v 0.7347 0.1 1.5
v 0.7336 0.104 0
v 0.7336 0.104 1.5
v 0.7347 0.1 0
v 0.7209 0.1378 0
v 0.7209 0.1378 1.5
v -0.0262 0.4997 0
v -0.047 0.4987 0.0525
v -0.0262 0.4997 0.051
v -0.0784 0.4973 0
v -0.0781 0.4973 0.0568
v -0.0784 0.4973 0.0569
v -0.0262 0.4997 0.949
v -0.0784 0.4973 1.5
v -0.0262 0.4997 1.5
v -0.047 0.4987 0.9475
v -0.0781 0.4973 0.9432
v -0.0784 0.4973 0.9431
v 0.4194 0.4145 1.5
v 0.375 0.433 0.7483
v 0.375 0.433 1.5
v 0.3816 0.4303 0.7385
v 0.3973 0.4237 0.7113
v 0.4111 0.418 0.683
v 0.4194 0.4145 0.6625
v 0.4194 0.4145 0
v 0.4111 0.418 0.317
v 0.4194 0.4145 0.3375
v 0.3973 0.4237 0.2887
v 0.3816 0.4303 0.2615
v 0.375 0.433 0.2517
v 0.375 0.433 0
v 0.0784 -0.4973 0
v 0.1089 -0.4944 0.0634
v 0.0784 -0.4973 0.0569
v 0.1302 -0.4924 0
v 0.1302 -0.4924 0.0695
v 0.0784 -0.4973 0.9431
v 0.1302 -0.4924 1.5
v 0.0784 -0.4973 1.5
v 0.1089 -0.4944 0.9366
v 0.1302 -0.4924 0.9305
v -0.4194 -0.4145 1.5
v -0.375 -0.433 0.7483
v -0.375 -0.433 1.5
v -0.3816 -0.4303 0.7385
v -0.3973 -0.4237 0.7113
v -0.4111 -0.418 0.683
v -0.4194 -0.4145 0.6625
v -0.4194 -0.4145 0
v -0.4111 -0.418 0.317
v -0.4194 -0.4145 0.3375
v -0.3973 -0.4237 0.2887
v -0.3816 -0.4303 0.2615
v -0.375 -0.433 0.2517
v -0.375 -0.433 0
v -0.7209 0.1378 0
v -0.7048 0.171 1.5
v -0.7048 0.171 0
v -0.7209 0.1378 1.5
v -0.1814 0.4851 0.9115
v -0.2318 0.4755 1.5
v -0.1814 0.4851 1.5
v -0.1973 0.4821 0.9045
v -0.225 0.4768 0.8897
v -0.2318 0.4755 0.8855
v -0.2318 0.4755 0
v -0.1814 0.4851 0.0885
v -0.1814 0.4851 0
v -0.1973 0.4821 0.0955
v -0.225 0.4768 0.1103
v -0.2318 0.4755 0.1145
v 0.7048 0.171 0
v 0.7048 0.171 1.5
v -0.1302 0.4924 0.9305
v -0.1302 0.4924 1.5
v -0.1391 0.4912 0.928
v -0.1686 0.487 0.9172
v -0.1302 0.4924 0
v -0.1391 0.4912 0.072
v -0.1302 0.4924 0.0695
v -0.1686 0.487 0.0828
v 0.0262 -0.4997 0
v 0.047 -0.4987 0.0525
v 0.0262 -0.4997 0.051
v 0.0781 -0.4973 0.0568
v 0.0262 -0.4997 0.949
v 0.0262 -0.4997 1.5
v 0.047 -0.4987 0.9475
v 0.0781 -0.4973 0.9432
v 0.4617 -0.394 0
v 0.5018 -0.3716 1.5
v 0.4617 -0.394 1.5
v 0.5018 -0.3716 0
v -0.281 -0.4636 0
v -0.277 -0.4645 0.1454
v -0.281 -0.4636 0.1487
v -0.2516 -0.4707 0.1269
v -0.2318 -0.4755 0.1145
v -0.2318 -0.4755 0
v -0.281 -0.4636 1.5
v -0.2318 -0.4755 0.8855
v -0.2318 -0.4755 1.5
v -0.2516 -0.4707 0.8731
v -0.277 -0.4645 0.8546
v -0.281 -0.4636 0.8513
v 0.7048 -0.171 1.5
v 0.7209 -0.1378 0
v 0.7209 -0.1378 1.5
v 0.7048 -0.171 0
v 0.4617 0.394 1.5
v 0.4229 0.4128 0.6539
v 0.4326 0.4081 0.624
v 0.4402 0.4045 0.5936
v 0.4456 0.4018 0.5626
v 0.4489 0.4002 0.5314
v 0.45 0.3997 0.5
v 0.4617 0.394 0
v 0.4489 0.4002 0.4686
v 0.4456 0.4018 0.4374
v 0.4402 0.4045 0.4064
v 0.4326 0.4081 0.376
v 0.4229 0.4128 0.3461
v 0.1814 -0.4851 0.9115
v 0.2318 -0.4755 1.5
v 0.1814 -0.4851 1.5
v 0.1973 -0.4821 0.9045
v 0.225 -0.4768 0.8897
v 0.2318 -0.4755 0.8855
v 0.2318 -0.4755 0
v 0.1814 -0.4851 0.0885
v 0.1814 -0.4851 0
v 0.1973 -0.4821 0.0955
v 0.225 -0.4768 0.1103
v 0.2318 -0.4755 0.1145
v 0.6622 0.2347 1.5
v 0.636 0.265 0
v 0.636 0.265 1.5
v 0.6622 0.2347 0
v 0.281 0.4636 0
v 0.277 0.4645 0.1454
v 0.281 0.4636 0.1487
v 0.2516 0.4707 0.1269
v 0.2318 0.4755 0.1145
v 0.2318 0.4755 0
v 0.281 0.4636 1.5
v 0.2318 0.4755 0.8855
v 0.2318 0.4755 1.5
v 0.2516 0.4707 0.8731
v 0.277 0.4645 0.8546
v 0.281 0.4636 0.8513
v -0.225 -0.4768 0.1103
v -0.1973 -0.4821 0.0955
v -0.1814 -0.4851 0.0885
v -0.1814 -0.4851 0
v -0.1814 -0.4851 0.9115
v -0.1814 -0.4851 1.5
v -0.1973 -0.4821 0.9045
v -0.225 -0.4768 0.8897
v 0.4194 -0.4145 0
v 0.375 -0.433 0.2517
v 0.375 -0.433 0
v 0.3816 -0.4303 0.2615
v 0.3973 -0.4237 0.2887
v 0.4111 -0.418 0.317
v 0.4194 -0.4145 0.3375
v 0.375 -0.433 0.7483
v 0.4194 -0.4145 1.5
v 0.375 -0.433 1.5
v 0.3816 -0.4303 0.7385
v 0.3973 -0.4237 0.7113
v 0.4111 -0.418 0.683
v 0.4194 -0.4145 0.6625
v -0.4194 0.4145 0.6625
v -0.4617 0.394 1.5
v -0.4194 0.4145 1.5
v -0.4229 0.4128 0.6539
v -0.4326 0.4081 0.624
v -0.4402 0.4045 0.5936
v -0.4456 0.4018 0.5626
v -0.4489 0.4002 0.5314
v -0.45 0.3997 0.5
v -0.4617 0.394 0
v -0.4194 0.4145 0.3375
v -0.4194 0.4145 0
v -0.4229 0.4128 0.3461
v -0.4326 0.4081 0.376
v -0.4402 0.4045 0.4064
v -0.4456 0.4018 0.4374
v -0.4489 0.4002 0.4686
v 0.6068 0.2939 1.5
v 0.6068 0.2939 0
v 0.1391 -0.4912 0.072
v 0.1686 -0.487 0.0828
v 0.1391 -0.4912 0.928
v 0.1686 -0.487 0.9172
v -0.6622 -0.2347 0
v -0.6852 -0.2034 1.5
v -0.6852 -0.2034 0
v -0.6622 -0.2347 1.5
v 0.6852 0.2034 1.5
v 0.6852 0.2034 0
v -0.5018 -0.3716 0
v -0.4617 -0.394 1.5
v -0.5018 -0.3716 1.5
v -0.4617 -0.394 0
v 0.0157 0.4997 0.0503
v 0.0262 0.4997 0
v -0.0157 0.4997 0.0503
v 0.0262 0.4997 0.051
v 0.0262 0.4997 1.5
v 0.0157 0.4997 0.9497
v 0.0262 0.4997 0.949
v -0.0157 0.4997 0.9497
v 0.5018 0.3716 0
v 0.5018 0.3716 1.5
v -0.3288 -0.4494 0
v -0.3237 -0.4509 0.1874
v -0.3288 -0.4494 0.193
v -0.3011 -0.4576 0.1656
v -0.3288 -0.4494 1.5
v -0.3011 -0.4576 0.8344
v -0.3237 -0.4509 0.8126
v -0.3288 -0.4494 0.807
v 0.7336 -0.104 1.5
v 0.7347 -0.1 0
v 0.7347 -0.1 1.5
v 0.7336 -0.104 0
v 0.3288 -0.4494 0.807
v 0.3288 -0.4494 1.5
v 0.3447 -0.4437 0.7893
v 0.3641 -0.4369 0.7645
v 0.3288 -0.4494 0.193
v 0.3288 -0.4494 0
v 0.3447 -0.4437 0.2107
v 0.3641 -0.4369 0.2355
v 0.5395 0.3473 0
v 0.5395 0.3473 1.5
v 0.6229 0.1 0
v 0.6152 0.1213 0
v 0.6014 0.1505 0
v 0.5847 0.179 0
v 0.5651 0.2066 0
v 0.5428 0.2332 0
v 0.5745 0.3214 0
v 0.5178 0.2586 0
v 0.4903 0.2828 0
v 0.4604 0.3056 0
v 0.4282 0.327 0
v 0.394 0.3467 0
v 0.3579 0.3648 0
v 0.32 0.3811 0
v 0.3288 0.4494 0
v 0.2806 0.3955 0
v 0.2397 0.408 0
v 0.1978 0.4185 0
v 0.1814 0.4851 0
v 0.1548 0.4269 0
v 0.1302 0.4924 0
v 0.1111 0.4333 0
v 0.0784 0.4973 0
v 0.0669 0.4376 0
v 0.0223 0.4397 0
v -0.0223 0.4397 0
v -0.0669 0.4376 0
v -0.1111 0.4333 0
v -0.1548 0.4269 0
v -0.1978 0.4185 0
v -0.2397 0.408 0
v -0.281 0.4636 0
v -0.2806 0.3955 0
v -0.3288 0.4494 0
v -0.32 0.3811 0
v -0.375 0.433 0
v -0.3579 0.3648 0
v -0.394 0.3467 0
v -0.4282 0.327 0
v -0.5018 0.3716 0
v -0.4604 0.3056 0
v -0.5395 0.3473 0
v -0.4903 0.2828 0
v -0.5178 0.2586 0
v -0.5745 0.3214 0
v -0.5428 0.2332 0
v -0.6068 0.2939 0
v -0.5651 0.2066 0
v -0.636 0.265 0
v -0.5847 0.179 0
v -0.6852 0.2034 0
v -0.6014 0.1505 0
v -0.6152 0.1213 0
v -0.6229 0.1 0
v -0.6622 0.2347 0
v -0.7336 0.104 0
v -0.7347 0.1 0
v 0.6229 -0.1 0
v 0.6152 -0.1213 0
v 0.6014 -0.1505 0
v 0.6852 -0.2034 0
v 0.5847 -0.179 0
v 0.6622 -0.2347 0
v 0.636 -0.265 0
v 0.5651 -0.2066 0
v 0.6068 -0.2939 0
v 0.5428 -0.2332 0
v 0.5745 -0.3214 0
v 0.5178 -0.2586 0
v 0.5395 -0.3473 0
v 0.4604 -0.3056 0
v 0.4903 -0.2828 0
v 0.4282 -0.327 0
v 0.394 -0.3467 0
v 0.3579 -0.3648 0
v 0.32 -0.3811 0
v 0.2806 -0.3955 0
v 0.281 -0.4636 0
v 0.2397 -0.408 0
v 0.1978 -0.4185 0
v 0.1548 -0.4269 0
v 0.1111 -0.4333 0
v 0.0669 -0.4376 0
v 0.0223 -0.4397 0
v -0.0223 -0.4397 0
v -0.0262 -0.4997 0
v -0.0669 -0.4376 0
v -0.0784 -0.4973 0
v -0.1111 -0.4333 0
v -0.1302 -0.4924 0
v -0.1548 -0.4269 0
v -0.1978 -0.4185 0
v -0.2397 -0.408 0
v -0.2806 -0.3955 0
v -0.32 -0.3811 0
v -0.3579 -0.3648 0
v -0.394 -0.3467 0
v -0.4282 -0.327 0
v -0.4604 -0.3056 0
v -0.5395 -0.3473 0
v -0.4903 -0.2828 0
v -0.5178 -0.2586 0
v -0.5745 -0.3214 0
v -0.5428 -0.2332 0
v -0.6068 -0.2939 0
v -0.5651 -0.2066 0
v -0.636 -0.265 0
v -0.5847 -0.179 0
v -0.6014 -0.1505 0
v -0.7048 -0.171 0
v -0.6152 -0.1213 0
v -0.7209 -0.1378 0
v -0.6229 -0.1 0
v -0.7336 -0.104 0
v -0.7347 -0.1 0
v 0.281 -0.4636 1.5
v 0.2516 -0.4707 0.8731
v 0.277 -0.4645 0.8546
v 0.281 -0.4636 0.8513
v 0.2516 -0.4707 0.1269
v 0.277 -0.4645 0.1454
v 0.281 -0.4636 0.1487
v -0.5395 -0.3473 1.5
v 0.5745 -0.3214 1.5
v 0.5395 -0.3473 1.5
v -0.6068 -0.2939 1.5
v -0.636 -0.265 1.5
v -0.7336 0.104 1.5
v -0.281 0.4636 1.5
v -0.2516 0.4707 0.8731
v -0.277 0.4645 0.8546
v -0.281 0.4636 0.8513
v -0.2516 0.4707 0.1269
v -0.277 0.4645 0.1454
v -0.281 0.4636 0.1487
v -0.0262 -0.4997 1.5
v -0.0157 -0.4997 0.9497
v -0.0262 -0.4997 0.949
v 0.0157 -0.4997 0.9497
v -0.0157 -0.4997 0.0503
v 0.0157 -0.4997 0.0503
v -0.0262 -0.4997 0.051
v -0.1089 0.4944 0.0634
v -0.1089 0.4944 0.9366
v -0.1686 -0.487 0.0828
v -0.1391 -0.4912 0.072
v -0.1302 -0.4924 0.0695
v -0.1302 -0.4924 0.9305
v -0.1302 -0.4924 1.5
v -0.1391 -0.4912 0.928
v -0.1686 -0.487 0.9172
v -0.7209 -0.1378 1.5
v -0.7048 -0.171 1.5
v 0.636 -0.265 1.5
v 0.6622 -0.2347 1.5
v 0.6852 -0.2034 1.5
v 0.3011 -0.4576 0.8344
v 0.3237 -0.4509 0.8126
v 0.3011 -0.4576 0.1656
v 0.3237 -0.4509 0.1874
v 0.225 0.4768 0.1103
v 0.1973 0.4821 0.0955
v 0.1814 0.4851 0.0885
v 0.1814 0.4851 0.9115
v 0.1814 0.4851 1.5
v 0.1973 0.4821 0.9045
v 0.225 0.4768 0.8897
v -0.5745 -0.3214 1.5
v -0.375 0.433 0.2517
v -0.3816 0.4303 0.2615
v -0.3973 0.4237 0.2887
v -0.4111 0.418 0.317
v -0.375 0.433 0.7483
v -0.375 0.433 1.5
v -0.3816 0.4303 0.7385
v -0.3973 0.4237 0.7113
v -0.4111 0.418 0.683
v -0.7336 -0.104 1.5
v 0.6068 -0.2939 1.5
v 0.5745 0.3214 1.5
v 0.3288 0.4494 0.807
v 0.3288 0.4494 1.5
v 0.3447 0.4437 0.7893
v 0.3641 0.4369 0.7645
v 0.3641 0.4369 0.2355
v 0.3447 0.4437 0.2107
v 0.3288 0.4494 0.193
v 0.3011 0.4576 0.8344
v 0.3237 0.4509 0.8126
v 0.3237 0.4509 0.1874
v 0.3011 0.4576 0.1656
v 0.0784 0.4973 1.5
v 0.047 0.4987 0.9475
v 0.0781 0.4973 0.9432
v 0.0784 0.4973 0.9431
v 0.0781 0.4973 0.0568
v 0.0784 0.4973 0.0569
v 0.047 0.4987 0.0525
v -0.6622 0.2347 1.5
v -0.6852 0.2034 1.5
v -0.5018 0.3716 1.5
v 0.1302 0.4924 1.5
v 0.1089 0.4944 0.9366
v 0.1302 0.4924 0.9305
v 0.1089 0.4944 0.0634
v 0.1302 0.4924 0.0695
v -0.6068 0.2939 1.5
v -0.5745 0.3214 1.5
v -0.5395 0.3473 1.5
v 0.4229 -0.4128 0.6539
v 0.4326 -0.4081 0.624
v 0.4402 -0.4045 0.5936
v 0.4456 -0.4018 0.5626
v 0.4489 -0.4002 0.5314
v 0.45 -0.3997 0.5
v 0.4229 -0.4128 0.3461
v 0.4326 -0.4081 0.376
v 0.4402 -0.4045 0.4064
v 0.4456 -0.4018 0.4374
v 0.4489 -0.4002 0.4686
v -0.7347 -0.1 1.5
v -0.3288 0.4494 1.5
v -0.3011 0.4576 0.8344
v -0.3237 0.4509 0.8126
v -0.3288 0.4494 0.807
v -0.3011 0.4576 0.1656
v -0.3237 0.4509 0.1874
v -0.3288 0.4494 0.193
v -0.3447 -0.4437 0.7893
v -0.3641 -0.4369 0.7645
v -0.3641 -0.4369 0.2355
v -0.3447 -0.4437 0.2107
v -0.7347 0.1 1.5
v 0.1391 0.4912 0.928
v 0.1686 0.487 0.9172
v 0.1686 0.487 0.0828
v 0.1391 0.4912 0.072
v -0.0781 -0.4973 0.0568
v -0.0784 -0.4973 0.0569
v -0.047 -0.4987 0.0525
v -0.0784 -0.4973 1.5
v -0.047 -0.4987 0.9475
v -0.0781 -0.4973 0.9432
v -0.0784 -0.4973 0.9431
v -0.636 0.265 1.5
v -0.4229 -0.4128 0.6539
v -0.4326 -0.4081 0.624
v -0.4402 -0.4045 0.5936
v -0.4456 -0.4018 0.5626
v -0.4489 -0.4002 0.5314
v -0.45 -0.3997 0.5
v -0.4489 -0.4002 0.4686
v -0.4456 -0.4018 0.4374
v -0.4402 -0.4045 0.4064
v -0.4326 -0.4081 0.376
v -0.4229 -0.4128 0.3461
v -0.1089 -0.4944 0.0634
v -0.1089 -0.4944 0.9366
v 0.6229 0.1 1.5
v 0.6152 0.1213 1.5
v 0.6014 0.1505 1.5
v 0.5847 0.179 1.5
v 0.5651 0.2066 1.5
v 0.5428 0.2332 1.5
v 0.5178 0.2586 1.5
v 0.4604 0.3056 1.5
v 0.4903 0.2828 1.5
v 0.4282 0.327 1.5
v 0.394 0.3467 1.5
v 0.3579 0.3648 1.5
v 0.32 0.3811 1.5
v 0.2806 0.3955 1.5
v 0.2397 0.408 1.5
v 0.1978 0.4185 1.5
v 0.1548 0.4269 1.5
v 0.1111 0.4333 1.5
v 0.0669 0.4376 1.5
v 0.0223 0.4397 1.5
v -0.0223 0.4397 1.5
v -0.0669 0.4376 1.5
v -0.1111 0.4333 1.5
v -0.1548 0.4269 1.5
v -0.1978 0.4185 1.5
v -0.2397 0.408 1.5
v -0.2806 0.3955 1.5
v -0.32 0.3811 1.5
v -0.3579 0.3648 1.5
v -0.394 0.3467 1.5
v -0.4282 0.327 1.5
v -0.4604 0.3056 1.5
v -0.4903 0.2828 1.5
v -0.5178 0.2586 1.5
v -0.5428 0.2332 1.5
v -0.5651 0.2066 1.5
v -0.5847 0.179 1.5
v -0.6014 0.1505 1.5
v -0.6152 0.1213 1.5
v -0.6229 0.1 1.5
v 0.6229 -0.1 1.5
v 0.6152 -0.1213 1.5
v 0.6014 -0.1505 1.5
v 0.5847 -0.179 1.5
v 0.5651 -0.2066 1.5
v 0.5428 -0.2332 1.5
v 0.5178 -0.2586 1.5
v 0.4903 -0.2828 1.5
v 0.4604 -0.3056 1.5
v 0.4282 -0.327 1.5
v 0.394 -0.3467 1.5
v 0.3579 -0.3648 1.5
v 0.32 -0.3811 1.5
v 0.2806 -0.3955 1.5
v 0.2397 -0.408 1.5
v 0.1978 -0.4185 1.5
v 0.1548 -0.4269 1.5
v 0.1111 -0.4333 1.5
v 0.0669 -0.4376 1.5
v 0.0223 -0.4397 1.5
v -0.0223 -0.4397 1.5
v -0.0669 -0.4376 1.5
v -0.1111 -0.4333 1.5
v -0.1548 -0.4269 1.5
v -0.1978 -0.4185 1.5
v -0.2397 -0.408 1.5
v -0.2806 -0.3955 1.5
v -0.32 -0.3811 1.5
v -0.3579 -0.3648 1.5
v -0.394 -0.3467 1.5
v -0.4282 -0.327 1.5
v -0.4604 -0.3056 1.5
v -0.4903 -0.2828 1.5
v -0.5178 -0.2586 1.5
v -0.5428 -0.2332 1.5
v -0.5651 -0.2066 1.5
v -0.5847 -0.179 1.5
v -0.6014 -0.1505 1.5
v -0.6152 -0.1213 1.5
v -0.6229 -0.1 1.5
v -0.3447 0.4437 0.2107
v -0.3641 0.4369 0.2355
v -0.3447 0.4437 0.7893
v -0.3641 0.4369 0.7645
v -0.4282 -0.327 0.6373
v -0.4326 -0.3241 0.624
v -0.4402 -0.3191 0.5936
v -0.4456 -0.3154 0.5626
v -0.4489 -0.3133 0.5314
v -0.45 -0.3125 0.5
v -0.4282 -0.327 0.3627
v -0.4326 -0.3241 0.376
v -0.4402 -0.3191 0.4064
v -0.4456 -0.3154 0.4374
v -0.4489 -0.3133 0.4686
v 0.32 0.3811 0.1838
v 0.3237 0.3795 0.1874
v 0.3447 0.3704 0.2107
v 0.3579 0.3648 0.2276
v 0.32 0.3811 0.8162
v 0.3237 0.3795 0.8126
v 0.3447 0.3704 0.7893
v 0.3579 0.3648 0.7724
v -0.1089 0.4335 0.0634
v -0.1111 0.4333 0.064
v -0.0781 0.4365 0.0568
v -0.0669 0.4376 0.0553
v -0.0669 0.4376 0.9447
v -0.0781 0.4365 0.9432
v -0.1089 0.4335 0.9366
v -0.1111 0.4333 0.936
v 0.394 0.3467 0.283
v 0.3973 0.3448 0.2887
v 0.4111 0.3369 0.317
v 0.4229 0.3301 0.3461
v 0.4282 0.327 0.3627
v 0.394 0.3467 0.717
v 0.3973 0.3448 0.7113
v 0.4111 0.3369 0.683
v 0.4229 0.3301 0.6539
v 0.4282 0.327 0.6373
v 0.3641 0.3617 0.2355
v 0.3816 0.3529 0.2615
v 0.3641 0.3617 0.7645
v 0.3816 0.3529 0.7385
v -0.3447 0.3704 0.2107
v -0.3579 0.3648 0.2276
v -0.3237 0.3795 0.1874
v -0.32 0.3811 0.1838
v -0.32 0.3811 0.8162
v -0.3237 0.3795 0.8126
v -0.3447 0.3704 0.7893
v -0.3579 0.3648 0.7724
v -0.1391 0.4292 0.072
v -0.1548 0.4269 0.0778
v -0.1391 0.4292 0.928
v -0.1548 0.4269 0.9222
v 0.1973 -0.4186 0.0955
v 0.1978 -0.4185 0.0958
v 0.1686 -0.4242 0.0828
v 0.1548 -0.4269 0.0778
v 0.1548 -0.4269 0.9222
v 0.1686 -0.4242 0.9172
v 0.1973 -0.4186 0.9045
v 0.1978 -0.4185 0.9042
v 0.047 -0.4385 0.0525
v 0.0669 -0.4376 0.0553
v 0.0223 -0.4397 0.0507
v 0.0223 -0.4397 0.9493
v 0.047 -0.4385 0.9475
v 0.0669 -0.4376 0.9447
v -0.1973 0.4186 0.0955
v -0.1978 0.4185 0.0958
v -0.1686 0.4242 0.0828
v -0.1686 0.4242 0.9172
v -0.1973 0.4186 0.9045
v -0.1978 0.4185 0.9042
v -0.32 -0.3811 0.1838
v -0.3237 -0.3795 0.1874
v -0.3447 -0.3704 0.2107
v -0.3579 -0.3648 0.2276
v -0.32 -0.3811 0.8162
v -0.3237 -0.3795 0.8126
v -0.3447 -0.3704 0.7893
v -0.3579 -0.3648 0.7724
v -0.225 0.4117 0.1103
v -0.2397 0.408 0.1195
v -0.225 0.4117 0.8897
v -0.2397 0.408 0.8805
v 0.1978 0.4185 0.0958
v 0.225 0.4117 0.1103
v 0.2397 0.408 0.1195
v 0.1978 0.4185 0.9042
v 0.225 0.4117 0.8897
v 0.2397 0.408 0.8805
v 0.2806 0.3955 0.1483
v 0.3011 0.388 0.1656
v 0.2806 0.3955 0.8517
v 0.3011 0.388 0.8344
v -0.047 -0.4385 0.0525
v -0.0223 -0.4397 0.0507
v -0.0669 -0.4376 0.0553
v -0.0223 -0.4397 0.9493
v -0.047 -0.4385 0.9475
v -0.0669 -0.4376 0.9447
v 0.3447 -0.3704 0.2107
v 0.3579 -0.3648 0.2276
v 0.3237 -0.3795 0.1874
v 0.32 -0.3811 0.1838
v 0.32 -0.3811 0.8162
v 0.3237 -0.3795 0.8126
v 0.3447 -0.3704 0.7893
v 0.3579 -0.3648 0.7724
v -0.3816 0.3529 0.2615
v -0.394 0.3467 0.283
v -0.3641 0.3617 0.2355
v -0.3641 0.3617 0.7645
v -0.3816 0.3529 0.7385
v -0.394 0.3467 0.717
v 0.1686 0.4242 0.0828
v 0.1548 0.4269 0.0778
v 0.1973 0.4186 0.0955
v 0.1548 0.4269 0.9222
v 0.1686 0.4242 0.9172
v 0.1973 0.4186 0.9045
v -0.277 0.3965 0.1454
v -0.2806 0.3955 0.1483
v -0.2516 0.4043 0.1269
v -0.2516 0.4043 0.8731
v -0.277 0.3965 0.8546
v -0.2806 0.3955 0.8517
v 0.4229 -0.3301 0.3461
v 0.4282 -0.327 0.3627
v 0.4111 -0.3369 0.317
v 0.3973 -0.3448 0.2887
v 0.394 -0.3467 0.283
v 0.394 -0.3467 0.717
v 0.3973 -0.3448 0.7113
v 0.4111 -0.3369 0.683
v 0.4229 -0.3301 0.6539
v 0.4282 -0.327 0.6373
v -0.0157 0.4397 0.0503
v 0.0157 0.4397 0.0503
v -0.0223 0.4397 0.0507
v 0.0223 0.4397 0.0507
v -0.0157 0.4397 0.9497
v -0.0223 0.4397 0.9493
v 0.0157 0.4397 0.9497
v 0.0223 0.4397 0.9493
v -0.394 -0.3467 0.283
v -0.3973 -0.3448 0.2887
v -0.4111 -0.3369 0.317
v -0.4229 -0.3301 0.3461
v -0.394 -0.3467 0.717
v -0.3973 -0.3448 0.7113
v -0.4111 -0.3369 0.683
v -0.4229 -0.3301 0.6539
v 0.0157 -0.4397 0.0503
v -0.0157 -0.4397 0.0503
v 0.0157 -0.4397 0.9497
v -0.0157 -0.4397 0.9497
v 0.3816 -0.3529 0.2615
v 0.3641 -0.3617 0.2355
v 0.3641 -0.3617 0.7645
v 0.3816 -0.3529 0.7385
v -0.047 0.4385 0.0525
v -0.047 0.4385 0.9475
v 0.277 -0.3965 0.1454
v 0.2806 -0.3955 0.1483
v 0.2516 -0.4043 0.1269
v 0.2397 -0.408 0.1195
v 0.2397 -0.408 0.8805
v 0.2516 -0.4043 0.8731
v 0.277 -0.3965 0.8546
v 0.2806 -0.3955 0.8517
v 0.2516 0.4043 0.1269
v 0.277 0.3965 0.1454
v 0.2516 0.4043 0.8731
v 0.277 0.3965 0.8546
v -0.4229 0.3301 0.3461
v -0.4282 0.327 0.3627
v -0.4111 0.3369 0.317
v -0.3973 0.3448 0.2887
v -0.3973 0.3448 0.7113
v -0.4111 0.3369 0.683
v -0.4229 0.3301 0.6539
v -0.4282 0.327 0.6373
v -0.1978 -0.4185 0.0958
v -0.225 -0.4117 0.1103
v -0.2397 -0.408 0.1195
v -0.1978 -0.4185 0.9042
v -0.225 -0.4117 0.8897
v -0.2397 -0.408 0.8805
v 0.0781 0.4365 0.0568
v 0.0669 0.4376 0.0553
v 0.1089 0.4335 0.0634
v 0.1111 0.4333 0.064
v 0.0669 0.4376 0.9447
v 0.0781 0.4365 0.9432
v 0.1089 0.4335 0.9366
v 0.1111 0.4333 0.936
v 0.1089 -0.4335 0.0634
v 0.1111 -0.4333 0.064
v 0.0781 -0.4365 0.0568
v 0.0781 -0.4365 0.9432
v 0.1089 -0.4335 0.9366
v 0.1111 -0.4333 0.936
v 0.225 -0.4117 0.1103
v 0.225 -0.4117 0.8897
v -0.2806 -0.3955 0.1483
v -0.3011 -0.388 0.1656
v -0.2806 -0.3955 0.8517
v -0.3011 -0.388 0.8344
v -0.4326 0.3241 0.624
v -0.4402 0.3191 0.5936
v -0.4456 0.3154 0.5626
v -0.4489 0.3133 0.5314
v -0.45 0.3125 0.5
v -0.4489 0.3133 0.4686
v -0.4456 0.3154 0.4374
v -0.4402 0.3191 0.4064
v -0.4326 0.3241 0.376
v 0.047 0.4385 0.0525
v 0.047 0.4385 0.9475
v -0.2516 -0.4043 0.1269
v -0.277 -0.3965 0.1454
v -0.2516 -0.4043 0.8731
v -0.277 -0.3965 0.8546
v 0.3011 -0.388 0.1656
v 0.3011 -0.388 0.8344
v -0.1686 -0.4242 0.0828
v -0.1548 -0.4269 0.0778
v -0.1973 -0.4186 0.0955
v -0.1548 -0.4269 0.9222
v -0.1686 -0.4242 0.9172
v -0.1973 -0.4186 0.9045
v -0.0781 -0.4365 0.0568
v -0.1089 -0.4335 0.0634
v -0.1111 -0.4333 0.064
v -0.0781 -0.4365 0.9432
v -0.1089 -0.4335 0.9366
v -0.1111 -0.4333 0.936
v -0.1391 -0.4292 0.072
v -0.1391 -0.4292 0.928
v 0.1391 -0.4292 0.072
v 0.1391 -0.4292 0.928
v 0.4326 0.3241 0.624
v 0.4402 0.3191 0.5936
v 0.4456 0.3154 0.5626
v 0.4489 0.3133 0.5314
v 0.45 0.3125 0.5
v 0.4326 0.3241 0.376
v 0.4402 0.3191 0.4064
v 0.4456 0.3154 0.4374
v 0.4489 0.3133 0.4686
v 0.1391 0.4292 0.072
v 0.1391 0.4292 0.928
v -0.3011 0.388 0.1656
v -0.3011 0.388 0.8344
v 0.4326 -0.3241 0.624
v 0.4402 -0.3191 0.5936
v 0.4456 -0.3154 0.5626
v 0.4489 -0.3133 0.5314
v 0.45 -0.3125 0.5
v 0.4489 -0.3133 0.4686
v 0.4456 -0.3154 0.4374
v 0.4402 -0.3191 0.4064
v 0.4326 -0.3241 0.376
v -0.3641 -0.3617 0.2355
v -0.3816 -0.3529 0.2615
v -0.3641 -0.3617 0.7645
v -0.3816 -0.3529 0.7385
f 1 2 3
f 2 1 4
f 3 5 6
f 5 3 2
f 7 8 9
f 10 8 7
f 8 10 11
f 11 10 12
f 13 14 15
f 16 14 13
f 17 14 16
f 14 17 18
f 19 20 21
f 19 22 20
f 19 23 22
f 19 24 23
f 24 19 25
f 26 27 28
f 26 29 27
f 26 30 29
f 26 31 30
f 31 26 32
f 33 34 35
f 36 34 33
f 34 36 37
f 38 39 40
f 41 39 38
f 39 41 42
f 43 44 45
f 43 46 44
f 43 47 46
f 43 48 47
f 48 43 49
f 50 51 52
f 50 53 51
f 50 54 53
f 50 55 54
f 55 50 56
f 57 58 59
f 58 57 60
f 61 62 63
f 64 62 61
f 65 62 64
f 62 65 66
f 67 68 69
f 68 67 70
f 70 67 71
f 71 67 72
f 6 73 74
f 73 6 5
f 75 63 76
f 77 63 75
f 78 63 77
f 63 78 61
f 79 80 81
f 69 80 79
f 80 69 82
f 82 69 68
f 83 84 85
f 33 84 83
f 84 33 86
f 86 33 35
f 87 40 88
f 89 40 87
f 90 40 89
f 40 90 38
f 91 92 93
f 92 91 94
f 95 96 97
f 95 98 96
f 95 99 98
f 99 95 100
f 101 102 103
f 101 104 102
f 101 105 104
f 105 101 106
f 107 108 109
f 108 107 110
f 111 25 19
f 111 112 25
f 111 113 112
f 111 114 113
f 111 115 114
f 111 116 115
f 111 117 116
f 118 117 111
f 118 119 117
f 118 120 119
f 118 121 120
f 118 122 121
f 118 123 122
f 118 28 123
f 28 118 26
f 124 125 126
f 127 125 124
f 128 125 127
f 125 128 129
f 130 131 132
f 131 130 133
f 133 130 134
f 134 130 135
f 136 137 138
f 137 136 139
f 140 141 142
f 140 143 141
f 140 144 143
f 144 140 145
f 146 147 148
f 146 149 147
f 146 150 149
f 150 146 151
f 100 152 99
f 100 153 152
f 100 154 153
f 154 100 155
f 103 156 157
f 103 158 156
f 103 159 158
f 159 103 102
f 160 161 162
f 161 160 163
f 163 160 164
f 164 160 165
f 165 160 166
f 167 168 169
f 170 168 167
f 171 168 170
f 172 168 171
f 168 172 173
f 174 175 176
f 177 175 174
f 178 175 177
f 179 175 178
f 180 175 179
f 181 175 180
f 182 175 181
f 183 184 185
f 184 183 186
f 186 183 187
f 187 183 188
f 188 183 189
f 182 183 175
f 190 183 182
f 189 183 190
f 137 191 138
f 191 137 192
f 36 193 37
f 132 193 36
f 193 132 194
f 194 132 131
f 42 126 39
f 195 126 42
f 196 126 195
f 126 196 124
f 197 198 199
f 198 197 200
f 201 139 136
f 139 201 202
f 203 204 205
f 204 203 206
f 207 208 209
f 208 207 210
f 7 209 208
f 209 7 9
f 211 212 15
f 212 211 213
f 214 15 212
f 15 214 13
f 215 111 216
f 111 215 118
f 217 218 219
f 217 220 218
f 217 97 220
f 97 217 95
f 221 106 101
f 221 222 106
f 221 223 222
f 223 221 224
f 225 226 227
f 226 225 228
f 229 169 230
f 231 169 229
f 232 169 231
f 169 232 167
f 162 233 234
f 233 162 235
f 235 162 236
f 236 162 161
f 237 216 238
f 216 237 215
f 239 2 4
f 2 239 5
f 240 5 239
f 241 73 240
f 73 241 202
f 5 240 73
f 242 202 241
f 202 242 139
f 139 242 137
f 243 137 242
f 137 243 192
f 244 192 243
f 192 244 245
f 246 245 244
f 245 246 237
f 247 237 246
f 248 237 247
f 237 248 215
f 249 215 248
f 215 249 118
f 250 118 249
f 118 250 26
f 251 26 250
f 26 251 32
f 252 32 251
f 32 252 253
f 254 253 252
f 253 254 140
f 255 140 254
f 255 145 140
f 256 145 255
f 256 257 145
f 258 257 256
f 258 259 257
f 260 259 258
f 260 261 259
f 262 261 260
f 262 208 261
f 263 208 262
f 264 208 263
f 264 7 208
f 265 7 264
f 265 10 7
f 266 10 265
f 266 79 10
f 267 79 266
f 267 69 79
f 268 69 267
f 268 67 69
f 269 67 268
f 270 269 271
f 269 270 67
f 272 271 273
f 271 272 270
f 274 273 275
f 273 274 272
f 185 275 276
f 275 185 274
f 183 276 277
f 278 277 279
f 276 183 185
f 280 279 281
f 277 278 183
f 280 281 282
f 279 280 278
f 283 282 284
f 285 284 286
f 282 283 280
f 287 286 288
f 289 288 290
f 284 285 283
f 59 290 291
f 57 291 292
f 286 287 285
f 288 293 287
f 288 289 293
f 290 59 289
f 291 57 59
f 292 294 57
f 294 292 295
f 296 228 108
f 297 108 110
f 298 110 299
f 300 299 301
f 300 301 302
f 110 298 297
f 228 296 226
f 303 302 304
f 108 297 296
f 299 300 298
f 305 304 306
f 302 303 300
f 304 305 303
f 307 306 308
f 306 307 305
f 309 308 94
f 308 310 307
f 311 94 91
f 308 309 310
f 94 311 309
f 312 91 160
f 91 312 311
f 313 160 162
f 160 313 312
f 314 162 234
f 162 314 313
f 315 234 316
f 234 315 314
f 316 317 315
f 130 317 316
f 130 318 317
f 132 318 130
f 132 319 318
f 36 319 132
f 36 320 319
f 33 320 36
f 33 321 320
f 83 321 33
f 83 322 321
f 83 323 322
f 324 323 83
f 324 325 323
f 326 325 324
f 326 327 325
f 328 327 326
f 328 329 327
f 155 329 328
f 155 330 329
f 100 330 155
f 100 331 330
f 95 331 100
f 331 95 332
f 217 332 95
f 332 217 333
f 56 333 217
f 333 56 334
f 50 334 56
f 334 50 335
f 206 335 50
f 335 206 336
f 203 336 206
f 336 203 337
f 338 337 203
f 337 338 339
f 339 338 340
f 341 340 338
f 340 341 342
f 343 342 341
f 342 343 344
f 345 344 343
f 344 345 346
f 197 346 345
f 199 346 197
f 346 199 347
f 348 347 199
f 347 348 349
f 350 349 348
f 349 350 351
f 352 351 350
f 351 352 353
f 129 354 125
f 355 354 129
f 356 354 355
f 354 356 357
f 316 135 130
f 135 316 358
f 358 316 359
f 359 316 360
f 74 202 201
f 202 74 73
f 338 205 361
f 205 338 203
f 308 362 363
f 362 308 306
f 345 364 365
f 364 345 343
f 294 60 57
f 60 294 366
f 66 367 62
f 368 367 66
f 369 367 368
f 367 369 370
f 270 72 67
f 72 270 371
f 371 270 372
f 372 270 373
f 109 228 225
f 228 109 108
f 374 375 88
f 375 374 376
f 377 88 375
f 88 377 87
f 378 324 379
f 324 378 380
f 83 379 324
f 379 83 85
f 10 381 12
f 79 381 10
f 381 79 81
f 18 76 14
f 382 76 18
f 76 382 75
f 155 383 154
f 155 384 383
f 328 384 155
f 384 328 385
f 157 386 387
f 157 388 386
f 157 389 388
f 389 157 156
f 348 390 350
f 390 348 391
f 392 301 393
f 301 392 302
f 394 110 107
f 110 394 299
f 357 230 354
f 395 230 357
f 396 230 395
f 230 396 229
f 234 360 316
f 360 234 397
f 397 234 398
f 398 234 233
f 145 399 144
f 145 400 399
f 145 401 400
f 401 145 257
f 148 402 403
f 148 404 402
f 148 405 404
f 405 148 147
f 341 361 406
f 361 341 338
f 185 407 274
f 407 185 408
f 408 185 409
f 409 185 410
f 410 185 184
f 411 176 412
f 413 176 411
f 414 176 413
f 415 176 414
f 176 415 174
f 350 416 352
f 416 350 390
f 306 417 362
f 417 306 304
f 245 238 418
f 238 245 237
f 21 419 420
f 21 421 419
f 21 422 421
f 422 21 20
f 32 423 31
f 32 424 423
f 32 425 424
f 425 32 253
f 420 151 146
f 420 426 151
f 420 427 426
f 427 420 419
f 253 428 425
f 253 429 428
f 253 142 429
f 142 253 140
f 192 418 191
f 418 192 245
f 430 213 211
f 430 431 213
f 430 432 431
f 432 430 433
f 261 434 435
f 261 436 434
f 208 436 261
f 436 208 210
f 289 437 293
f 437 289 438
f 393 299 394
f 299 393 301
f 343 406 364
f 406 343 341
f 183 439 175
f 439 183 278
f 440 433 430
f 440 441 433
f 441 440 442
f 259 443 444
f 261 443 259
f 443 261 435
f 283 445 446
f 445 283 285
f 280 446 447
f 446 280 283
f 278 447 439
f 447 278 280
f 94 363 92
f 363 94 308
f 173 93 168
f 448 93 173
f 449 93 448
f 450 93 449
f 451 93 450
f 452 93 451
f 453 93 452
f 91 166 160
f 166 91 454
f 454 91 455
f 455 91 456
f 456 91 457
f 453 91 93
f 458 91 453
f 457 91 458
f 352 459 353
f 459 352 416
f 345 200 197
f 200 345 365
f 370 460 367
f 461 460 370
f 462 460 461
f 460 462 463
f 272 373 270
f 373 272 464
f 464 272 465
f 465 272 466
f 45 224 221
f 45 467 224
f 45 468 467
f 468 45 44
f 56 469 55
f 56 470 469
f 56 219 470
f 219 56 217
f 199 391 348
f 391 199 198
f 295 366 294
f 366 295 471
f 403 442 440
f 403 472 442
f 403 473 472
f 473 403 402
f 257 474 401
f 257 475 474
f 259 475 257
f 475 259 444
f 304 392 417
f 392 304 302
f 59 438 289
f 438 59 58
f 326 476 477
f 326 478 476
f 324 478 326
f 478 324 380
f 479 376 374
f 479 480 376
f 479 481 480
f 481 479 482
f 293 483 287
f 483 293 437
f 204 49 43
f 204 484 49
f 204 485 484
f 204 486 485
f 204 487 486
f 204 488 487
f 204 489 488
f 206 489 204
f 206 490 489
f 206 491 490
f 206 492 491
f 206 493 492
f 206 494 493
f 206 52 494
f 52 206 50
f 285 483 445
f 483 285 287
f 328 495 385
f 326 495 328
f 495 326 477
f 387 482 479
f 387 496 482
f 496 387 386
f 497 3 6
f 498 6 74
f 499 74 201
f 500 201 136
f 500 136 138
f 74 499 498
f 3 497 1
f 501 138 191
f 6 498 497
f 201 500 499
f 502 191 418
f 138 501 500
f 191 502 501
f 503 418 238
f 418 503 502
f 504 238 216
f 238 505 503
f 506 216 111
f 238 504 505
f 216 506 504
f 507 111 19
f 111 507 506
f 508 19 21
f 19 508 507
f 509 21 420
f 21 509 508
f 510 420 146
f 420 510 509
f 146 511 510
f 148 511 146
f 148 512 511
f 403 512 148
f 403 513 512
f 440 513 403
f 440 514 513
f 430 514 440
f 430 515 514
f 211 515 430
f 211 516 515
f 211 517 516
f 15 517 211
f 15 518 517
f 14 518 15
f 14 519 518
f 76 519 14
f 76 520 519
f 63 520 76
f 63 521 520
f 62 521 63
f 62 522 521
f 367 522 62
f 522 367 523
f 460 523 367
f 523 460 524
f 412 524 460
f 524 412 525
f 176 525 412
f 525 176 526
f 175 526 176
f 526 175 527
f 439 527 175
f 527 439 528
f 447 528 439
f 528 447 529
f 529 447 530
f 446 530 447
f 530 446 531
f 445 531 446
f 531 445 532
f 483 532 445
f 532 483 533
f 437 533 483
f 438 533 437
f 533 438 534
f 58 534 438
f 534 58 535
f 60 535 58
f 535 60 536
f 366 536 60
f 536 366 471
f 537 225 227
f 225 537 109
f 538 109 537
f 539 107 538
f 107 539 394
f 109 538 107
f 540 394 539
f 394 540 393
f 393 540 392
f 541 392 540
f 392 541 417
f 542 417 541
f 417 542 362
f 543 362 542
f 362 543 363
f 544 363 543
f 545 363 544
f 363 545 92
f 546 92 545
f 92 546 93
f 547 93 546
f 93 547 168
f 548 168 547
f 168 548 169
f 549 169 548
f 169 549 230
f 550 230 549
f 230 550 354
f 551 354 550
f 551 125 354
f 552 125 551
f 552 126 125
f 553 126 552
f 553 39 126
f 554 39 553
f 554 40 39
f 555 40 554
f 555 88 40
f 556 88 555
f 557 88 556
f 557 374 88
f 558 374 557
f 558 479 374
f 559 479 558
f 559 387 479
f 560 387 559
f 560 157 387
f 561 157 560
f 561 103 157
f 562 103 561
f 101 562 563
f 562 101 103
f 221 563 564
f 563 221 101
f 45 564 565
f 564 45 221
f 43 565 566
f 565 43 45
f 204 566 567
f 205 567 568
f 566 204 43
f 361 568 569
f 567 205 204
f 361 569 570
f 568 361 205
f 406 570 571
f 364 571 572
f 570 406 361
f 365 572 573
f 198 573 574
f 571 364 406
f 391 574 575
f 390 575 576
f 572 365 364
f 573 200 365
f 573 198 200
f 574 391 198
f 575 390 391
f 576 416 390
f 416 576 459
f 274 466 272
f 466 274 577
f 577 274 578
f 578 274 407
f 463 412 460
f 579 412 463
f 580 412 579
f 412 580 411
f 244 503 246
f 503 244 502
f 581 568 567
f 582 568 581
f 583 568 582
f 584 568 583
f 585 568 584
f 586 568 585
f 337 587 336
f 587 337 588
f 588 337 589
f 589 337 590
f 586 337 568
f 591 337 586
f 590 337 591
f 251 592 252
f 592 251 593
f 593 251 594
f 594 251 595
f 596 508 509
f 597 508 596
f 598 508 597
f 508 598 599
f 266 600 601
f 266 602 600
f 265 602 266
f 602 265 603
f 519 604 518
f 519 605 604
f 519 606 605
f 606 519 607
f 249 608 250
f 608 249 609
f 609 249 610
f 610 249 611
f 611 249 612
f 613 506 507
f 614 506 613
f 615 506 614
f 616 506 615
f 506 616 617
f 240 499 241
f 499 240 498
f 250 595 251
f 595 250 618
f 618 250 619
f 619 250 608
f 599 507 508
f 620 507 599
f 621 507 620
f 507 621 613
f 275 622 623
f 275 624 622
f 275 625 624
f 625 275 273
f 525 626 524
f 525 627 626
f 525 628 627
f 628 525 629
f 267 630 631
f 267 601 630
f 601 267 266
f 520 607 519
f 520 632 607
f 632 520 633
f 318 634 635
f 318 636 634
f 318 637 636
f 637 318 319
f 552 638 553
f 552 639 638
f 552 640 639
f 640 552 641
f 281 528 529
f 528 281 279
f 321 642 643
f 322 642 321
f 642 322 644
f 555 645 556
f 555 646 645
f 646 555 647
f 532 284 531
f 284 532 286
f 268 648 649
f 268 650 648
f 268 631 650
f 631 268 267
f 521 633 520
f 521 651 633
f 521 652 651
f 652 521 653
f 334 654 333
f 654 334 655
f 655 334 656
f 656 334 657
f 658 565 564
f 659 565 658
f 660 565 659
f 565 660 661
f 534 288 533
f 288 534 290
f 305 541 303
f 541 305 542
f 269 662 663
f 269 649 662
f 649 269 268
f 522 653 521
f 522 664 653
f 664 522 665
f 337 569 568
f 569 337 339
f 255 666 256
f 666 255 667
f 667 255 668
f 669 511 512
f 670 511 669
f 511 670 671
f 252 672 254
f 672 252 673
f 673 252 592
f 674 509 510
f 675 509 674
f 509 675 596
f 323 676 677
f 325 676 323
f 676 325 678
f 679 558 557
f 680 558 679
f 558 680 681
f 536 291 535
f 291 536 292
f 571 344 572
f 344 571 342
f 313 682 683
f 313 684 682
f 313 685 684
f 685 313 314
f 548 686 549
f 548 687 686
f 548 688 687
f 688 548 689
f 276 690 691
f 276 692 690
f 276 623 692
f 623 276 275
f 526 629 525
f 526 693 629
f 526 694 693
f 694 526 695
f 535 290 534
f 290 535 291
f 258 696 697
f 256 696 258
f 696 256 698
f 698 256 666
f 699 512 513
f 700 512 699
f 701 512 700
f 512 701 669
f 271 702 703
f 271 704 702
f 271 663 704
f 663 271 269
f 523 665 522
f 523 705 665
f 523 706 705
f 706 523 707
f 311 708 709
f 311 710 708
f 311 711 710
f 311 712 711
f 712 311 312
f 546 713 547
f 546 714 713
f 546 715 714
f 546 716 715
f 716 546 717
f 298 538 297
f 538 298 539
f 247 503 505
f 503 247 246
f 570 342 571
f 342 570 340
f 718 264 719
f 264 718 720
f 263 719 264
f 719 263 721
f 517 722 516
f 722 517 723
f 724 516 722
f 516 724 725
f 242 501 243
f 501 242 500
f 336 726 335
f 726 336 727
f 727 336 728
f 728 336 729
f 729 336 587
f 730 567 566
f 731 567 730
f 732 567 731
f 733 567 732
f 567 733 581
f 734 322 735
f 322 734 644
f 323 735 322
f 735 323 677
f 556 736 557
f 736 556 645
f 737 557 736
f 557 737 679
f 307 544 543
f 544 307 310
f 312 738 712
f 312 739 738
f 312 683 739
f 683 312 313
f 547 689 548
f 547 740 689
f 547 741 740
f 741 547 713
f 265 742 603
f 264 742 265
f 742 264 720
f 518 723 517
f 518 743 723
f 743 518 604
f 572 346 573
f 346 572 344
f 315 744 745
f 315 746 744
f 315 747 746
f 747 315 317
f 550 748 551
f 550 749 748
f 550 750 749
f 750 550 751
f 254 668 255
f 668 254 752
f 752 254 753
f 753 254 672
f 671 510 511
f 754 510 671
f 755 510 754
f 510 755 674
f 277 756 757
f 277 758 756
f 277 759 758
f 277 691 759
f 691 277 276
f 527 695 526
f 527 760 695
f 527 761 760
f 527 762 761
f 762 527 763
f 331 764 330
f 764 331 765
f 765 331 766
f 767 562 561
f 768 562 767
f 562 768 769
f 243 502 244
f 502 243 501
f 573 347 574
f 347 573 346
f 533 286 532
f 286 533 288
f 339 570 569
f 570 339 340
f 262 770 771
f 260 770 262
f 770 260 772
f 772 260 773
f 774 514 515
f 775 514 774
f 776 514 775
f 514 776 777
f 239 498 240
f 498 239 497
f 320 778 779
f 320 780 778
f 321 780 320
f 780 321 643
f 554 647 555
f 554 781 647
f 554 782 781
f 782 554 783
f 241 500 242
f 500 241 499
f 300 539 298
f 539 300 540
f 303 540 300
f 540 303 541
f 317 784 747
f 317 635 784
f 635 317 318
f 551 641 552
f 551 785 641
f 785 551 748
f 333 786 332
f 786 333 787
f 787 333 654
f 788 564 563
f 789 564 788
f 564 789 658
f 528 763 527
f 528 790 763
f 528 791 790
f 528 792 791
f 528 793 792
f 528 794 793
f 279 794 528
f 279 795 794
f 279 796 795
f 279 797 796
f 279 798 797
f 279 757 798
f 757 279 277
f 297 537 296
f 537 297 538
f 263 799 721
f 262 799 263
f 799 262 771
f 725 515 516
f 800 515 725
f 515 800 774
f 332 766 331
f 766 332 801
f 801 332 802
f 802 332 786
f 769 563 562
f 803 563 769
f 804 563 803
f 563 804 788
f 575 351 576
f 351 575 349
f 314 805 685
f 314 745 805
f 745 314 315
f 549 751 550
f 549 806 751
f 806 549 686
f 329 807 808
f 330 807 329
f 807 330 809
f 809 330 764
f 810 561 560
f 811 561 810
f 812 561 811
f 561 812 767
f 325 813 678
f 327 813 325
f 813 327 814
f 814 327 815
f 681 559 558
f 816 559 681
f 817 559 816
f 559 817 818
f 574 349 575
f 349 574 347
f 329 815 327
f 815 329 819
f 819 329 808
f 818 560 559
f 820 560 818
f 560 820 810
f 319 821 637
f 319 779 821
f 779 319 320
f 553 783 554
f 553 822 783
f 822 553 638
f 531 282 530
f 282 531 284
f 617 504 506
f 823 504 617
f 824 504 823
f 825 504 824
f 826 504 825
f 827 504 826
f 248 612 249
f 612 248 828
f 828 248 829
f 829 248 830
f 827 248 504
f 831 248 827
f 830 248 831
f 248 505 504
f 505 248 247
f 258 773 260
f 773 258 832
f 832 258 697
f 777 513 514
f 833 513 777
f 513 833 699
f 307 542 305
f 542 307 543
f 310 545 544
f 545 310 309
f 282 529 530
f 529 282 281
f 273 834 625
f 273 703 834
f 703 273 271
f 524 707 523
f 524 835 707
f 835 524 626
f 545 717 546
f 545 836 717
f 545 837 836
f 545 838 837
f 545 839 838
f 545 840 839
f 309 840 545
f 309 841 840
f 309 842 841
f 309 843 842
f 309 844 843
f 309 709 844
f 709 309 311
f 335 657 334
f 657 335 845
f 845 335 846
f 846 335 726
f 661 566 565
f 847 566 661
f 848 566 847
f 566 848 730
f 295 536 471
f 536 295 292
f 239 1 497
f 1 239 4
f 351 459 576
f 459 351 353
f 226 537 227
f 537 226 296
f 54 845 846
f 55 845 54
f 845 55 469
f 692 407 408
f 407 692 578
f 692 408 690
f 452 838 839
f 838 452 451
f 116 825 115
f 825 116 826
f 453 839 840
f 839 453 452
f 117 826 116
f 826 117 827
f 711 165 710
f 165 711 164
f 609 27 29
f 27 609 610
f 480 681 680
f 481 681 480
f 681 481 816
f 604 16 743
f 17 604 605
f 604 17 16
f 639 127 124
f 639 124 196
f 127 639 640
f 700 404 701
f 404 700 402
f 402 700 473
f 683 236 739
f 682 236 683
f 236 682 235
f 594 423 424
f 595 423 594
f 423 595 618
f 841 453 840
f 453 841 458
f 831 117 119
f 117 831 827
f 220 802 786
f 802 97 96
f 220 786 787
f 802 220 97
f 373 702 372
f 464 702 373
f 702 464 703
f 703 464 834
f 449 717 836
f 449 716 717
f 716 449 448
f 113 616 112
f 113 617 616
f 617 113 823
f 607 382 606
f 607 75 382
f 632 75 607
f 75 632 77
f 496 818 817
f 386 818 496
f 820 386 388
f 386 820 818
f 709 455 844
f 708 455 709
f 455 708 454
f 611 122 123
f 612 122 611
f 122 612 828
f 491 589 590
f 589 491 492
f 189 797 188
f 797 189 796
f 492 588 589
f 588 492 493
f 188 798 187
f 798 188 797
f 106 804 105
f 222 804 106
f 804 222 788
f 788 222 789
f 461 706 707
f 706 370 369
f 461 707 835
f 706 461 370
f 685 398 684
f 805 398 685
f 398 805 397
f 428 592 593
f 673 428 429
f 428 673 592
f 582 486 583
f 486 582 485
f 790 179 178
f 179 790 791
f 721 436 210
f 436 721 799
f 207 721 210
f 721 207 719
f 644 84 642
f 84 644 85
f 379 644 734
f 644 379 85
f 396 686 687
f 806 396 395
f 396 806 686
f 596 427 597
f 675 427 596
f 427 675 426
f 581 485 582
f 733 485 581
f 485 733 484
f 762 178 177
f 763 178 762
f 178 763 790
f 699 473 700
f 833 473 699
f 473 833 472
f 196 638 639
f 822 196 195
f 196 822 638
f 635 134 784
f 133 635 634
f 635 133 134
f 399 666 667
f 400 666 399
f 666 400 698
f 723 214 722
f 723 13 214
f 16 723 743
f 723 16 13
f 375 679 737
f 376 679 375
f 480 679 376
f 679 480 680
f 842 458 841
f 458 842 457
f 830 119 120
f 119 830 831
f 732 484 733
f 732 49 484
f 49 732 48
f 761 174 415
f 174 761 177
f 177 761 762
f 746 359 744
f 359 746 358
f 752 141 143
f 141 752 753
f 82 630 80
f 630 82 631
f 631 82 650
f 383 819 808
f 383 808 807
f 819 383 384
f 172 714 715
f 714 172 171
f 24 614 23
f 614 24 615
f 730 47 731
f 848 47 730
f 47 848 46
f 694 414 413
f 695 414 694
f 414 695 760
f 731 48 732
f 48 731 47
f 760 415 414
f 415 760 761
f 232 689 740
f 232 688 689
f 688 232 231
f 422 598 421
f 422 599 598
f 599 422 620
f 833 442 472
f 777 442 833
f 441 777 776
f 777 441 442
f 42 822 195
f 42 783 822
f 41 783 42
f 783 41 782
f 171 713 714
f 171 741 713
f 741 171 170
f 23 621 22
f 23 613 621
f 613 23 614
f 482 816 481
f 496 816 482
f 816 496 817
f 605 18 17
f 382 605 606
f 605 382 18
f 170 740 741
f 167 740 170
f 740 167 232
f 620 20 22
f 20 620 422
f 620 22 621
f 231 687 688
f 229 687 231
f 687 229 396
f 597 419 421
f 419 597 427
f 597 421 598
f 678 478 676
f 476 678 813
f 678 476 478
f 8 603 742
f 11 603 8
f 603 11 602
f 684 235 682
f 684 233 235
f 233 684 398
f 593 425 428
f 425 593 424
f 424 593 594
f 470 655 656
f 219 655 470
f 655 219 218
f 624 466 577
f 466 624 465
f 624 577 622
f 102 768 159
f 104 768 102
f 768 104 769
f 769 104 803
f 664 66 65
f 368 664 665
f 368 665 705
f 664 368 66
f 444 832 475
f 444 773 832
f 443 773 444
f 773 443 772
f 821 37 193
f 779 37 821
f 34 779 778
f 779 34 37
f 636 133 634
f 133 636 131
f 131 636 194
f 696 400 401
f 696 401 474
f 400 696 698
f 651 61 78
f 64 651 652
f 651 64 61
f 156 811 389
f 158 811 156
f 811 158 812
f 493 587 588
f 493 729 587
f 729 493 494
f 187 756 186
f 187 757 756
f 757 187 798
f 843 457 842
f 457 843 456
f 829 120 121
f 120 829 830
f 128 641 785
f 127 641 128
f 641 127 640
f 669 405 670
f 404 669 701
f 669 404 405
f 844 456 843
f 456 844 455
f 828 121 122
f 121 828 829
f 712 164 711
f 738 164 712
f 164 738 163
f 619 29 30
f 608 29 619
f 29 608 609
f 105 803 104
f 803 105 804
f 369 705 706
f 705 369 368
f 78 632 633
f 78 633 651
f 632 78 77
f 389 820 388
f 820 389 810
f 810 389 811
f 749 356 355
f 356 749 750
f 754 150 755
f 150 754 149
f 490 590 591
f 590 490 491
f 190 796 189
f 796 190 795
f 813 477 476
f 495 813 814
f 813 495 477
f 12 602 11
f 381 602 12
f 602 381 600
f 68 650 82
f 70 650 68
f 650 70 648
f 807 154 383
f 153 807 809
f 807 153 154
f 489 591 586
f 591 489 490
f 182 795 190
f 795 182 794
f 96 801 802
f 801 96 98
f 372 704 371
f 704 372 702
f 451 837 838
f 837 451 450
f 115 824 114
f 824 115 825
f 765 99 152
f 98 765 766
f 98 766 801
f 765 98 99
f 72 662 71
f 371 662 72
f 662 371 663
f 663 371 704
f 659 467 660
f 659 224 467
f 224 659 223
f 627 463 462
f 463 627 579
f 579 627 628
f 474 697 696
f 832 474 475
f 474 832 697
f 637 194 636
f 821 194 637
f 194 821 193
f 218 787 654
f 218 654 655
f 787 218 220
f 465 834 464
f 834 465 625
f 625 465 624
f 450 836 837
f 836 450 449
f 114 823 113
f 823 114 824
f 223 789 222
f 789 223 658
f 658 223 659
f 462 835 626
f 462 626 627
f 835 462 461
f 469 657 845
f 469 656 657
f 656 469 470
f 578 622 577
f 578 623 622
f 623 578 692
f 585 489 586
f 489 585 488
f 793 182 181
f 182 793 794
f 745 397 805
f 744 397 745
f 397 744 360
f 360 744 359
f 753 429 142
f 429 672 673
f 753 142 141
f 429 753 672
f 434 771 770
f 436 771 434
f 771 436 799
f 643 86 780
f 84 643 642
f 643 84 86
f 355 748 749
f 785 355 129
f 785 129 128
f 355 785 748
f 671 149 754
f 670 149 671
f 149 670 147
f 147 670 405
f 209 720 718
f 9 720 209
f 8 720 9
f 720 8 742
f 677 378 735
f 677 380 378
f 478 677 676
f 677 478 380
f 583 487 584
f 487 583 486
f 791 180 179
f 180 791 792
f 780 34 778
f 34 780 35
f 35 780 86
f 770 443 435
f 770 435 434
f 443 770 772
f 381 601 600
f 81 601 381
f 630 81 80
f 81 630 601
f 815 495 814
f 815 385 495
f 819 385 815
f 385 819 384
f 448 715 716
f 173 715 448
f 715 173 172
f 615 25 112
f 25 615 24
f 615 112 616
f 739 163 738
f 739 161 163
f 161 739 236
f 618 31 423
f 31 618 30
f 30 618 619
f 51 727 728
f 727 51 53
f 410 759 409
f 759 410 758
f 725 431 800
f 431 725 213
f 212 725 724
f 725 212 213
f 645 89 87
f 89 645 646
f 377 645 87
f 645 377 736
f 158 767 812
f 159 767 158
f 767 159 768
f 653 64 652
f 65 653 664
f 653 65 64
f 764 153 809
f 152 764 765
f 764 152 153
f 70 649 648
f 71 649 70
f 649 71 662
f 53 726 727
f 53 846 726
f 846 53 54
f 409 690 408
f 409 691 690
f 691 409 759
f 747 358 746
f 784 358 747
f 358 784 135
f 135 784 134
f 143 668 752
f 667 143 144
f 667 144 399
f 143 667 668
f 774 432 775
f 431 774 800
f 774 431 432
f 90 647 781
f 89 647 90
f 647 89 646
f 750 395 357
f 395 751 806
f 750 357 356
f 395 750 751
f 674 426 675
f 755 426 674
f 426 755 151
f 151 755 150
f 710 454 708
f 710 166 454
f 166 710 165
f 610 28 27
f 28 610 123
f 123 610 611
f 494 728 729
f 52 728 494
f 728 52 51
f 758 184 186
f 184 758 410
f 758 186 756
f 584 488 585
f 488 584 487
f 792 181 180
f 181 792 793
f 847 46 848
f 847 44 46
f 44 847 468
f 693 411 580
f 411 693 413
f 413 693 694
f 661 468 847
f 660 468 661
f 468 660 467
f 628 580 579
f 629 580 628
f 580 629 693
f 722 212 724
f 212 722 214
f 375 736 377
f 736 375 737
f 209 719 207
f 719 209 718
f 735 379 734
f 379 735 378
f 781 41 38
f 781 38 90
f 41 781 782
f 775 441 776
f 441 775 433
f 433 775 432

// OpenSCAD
// Generated by SolidPython 1.1.3 on 2024-12-04 15:15:47
$fn = 90;


difference() {
	scale(v = [1.5000000000, 1, 1]) {
		cylinder(h = 1.5000000000, r = 0.5000000000);
	}
	scale(v = [1.6000000000, 1.1000000000, 1]) {
		cylinder(h = 2, r = 0.4000000000);
	}
	scale(v = [2, 0.2000000000, 2]) {
		translate(v = [-0.5000000000, -0.5000000000, 0]) {
			cube();
		}
	}
	translate(v = [0, 0.7000000000, 0.5000000000]) {
		rotate(a = [90, 0, 0]) {
			cylinder(h = 2, r = 0.4500000000);
		}
	}
}
/***********************************************
*********      SolidPython code:      **********
************************************************
 
# SolidPython example code 
# Brygg Ullmer, Clemson University
# Begun 2024-10-24

from solid import *        # load in SolidPython/SCAD support code

cyl1a = cylinder(r=.5,  h=1.5); cyl1b = scale([1.5, 1,   1])(cyl1a) #cyl1b expresses the outer perimeter.  
cyl2a = cylinder(r=.4,  h=2);   cyl2b = scale([1.6, 1.1, 1])(cyl2a) #cyl2b is for cutting away the inside

outGeom = cyl1b - cyl2b #this performs the subtraction/cut, leaving an elliptical pipe.  output as exSolid04a.png 

cube1a = cube();  cube1b = translate([ -.5, -.5, 0 ])(cube1a); cube1c = scale([2, .2, 2])(cube1b) #for cutting the pipe in two

cyl3a = cylinder(r=.45, h=2); cyl3b = rotate(a = [90, 0, 0])(cyl3a)
cyl3c = translate([0, .7, .5 ])(cyl3b) #cylinder for large hole perforating the two halves of the oculus

outGeom -= cube1c #cleave the pipe into left and right halves
outGeom -= cyl3c  #perforate the two halves of the oculus 

radialSegments = 90; hdr = '$fn = %s;' % radialSegments # create a header for the export
scad_render_to_file(outGeom, 'exSolid04b.scad', file_header=hdr) # write the .scad file

### end ###

 
 
************************************************/
